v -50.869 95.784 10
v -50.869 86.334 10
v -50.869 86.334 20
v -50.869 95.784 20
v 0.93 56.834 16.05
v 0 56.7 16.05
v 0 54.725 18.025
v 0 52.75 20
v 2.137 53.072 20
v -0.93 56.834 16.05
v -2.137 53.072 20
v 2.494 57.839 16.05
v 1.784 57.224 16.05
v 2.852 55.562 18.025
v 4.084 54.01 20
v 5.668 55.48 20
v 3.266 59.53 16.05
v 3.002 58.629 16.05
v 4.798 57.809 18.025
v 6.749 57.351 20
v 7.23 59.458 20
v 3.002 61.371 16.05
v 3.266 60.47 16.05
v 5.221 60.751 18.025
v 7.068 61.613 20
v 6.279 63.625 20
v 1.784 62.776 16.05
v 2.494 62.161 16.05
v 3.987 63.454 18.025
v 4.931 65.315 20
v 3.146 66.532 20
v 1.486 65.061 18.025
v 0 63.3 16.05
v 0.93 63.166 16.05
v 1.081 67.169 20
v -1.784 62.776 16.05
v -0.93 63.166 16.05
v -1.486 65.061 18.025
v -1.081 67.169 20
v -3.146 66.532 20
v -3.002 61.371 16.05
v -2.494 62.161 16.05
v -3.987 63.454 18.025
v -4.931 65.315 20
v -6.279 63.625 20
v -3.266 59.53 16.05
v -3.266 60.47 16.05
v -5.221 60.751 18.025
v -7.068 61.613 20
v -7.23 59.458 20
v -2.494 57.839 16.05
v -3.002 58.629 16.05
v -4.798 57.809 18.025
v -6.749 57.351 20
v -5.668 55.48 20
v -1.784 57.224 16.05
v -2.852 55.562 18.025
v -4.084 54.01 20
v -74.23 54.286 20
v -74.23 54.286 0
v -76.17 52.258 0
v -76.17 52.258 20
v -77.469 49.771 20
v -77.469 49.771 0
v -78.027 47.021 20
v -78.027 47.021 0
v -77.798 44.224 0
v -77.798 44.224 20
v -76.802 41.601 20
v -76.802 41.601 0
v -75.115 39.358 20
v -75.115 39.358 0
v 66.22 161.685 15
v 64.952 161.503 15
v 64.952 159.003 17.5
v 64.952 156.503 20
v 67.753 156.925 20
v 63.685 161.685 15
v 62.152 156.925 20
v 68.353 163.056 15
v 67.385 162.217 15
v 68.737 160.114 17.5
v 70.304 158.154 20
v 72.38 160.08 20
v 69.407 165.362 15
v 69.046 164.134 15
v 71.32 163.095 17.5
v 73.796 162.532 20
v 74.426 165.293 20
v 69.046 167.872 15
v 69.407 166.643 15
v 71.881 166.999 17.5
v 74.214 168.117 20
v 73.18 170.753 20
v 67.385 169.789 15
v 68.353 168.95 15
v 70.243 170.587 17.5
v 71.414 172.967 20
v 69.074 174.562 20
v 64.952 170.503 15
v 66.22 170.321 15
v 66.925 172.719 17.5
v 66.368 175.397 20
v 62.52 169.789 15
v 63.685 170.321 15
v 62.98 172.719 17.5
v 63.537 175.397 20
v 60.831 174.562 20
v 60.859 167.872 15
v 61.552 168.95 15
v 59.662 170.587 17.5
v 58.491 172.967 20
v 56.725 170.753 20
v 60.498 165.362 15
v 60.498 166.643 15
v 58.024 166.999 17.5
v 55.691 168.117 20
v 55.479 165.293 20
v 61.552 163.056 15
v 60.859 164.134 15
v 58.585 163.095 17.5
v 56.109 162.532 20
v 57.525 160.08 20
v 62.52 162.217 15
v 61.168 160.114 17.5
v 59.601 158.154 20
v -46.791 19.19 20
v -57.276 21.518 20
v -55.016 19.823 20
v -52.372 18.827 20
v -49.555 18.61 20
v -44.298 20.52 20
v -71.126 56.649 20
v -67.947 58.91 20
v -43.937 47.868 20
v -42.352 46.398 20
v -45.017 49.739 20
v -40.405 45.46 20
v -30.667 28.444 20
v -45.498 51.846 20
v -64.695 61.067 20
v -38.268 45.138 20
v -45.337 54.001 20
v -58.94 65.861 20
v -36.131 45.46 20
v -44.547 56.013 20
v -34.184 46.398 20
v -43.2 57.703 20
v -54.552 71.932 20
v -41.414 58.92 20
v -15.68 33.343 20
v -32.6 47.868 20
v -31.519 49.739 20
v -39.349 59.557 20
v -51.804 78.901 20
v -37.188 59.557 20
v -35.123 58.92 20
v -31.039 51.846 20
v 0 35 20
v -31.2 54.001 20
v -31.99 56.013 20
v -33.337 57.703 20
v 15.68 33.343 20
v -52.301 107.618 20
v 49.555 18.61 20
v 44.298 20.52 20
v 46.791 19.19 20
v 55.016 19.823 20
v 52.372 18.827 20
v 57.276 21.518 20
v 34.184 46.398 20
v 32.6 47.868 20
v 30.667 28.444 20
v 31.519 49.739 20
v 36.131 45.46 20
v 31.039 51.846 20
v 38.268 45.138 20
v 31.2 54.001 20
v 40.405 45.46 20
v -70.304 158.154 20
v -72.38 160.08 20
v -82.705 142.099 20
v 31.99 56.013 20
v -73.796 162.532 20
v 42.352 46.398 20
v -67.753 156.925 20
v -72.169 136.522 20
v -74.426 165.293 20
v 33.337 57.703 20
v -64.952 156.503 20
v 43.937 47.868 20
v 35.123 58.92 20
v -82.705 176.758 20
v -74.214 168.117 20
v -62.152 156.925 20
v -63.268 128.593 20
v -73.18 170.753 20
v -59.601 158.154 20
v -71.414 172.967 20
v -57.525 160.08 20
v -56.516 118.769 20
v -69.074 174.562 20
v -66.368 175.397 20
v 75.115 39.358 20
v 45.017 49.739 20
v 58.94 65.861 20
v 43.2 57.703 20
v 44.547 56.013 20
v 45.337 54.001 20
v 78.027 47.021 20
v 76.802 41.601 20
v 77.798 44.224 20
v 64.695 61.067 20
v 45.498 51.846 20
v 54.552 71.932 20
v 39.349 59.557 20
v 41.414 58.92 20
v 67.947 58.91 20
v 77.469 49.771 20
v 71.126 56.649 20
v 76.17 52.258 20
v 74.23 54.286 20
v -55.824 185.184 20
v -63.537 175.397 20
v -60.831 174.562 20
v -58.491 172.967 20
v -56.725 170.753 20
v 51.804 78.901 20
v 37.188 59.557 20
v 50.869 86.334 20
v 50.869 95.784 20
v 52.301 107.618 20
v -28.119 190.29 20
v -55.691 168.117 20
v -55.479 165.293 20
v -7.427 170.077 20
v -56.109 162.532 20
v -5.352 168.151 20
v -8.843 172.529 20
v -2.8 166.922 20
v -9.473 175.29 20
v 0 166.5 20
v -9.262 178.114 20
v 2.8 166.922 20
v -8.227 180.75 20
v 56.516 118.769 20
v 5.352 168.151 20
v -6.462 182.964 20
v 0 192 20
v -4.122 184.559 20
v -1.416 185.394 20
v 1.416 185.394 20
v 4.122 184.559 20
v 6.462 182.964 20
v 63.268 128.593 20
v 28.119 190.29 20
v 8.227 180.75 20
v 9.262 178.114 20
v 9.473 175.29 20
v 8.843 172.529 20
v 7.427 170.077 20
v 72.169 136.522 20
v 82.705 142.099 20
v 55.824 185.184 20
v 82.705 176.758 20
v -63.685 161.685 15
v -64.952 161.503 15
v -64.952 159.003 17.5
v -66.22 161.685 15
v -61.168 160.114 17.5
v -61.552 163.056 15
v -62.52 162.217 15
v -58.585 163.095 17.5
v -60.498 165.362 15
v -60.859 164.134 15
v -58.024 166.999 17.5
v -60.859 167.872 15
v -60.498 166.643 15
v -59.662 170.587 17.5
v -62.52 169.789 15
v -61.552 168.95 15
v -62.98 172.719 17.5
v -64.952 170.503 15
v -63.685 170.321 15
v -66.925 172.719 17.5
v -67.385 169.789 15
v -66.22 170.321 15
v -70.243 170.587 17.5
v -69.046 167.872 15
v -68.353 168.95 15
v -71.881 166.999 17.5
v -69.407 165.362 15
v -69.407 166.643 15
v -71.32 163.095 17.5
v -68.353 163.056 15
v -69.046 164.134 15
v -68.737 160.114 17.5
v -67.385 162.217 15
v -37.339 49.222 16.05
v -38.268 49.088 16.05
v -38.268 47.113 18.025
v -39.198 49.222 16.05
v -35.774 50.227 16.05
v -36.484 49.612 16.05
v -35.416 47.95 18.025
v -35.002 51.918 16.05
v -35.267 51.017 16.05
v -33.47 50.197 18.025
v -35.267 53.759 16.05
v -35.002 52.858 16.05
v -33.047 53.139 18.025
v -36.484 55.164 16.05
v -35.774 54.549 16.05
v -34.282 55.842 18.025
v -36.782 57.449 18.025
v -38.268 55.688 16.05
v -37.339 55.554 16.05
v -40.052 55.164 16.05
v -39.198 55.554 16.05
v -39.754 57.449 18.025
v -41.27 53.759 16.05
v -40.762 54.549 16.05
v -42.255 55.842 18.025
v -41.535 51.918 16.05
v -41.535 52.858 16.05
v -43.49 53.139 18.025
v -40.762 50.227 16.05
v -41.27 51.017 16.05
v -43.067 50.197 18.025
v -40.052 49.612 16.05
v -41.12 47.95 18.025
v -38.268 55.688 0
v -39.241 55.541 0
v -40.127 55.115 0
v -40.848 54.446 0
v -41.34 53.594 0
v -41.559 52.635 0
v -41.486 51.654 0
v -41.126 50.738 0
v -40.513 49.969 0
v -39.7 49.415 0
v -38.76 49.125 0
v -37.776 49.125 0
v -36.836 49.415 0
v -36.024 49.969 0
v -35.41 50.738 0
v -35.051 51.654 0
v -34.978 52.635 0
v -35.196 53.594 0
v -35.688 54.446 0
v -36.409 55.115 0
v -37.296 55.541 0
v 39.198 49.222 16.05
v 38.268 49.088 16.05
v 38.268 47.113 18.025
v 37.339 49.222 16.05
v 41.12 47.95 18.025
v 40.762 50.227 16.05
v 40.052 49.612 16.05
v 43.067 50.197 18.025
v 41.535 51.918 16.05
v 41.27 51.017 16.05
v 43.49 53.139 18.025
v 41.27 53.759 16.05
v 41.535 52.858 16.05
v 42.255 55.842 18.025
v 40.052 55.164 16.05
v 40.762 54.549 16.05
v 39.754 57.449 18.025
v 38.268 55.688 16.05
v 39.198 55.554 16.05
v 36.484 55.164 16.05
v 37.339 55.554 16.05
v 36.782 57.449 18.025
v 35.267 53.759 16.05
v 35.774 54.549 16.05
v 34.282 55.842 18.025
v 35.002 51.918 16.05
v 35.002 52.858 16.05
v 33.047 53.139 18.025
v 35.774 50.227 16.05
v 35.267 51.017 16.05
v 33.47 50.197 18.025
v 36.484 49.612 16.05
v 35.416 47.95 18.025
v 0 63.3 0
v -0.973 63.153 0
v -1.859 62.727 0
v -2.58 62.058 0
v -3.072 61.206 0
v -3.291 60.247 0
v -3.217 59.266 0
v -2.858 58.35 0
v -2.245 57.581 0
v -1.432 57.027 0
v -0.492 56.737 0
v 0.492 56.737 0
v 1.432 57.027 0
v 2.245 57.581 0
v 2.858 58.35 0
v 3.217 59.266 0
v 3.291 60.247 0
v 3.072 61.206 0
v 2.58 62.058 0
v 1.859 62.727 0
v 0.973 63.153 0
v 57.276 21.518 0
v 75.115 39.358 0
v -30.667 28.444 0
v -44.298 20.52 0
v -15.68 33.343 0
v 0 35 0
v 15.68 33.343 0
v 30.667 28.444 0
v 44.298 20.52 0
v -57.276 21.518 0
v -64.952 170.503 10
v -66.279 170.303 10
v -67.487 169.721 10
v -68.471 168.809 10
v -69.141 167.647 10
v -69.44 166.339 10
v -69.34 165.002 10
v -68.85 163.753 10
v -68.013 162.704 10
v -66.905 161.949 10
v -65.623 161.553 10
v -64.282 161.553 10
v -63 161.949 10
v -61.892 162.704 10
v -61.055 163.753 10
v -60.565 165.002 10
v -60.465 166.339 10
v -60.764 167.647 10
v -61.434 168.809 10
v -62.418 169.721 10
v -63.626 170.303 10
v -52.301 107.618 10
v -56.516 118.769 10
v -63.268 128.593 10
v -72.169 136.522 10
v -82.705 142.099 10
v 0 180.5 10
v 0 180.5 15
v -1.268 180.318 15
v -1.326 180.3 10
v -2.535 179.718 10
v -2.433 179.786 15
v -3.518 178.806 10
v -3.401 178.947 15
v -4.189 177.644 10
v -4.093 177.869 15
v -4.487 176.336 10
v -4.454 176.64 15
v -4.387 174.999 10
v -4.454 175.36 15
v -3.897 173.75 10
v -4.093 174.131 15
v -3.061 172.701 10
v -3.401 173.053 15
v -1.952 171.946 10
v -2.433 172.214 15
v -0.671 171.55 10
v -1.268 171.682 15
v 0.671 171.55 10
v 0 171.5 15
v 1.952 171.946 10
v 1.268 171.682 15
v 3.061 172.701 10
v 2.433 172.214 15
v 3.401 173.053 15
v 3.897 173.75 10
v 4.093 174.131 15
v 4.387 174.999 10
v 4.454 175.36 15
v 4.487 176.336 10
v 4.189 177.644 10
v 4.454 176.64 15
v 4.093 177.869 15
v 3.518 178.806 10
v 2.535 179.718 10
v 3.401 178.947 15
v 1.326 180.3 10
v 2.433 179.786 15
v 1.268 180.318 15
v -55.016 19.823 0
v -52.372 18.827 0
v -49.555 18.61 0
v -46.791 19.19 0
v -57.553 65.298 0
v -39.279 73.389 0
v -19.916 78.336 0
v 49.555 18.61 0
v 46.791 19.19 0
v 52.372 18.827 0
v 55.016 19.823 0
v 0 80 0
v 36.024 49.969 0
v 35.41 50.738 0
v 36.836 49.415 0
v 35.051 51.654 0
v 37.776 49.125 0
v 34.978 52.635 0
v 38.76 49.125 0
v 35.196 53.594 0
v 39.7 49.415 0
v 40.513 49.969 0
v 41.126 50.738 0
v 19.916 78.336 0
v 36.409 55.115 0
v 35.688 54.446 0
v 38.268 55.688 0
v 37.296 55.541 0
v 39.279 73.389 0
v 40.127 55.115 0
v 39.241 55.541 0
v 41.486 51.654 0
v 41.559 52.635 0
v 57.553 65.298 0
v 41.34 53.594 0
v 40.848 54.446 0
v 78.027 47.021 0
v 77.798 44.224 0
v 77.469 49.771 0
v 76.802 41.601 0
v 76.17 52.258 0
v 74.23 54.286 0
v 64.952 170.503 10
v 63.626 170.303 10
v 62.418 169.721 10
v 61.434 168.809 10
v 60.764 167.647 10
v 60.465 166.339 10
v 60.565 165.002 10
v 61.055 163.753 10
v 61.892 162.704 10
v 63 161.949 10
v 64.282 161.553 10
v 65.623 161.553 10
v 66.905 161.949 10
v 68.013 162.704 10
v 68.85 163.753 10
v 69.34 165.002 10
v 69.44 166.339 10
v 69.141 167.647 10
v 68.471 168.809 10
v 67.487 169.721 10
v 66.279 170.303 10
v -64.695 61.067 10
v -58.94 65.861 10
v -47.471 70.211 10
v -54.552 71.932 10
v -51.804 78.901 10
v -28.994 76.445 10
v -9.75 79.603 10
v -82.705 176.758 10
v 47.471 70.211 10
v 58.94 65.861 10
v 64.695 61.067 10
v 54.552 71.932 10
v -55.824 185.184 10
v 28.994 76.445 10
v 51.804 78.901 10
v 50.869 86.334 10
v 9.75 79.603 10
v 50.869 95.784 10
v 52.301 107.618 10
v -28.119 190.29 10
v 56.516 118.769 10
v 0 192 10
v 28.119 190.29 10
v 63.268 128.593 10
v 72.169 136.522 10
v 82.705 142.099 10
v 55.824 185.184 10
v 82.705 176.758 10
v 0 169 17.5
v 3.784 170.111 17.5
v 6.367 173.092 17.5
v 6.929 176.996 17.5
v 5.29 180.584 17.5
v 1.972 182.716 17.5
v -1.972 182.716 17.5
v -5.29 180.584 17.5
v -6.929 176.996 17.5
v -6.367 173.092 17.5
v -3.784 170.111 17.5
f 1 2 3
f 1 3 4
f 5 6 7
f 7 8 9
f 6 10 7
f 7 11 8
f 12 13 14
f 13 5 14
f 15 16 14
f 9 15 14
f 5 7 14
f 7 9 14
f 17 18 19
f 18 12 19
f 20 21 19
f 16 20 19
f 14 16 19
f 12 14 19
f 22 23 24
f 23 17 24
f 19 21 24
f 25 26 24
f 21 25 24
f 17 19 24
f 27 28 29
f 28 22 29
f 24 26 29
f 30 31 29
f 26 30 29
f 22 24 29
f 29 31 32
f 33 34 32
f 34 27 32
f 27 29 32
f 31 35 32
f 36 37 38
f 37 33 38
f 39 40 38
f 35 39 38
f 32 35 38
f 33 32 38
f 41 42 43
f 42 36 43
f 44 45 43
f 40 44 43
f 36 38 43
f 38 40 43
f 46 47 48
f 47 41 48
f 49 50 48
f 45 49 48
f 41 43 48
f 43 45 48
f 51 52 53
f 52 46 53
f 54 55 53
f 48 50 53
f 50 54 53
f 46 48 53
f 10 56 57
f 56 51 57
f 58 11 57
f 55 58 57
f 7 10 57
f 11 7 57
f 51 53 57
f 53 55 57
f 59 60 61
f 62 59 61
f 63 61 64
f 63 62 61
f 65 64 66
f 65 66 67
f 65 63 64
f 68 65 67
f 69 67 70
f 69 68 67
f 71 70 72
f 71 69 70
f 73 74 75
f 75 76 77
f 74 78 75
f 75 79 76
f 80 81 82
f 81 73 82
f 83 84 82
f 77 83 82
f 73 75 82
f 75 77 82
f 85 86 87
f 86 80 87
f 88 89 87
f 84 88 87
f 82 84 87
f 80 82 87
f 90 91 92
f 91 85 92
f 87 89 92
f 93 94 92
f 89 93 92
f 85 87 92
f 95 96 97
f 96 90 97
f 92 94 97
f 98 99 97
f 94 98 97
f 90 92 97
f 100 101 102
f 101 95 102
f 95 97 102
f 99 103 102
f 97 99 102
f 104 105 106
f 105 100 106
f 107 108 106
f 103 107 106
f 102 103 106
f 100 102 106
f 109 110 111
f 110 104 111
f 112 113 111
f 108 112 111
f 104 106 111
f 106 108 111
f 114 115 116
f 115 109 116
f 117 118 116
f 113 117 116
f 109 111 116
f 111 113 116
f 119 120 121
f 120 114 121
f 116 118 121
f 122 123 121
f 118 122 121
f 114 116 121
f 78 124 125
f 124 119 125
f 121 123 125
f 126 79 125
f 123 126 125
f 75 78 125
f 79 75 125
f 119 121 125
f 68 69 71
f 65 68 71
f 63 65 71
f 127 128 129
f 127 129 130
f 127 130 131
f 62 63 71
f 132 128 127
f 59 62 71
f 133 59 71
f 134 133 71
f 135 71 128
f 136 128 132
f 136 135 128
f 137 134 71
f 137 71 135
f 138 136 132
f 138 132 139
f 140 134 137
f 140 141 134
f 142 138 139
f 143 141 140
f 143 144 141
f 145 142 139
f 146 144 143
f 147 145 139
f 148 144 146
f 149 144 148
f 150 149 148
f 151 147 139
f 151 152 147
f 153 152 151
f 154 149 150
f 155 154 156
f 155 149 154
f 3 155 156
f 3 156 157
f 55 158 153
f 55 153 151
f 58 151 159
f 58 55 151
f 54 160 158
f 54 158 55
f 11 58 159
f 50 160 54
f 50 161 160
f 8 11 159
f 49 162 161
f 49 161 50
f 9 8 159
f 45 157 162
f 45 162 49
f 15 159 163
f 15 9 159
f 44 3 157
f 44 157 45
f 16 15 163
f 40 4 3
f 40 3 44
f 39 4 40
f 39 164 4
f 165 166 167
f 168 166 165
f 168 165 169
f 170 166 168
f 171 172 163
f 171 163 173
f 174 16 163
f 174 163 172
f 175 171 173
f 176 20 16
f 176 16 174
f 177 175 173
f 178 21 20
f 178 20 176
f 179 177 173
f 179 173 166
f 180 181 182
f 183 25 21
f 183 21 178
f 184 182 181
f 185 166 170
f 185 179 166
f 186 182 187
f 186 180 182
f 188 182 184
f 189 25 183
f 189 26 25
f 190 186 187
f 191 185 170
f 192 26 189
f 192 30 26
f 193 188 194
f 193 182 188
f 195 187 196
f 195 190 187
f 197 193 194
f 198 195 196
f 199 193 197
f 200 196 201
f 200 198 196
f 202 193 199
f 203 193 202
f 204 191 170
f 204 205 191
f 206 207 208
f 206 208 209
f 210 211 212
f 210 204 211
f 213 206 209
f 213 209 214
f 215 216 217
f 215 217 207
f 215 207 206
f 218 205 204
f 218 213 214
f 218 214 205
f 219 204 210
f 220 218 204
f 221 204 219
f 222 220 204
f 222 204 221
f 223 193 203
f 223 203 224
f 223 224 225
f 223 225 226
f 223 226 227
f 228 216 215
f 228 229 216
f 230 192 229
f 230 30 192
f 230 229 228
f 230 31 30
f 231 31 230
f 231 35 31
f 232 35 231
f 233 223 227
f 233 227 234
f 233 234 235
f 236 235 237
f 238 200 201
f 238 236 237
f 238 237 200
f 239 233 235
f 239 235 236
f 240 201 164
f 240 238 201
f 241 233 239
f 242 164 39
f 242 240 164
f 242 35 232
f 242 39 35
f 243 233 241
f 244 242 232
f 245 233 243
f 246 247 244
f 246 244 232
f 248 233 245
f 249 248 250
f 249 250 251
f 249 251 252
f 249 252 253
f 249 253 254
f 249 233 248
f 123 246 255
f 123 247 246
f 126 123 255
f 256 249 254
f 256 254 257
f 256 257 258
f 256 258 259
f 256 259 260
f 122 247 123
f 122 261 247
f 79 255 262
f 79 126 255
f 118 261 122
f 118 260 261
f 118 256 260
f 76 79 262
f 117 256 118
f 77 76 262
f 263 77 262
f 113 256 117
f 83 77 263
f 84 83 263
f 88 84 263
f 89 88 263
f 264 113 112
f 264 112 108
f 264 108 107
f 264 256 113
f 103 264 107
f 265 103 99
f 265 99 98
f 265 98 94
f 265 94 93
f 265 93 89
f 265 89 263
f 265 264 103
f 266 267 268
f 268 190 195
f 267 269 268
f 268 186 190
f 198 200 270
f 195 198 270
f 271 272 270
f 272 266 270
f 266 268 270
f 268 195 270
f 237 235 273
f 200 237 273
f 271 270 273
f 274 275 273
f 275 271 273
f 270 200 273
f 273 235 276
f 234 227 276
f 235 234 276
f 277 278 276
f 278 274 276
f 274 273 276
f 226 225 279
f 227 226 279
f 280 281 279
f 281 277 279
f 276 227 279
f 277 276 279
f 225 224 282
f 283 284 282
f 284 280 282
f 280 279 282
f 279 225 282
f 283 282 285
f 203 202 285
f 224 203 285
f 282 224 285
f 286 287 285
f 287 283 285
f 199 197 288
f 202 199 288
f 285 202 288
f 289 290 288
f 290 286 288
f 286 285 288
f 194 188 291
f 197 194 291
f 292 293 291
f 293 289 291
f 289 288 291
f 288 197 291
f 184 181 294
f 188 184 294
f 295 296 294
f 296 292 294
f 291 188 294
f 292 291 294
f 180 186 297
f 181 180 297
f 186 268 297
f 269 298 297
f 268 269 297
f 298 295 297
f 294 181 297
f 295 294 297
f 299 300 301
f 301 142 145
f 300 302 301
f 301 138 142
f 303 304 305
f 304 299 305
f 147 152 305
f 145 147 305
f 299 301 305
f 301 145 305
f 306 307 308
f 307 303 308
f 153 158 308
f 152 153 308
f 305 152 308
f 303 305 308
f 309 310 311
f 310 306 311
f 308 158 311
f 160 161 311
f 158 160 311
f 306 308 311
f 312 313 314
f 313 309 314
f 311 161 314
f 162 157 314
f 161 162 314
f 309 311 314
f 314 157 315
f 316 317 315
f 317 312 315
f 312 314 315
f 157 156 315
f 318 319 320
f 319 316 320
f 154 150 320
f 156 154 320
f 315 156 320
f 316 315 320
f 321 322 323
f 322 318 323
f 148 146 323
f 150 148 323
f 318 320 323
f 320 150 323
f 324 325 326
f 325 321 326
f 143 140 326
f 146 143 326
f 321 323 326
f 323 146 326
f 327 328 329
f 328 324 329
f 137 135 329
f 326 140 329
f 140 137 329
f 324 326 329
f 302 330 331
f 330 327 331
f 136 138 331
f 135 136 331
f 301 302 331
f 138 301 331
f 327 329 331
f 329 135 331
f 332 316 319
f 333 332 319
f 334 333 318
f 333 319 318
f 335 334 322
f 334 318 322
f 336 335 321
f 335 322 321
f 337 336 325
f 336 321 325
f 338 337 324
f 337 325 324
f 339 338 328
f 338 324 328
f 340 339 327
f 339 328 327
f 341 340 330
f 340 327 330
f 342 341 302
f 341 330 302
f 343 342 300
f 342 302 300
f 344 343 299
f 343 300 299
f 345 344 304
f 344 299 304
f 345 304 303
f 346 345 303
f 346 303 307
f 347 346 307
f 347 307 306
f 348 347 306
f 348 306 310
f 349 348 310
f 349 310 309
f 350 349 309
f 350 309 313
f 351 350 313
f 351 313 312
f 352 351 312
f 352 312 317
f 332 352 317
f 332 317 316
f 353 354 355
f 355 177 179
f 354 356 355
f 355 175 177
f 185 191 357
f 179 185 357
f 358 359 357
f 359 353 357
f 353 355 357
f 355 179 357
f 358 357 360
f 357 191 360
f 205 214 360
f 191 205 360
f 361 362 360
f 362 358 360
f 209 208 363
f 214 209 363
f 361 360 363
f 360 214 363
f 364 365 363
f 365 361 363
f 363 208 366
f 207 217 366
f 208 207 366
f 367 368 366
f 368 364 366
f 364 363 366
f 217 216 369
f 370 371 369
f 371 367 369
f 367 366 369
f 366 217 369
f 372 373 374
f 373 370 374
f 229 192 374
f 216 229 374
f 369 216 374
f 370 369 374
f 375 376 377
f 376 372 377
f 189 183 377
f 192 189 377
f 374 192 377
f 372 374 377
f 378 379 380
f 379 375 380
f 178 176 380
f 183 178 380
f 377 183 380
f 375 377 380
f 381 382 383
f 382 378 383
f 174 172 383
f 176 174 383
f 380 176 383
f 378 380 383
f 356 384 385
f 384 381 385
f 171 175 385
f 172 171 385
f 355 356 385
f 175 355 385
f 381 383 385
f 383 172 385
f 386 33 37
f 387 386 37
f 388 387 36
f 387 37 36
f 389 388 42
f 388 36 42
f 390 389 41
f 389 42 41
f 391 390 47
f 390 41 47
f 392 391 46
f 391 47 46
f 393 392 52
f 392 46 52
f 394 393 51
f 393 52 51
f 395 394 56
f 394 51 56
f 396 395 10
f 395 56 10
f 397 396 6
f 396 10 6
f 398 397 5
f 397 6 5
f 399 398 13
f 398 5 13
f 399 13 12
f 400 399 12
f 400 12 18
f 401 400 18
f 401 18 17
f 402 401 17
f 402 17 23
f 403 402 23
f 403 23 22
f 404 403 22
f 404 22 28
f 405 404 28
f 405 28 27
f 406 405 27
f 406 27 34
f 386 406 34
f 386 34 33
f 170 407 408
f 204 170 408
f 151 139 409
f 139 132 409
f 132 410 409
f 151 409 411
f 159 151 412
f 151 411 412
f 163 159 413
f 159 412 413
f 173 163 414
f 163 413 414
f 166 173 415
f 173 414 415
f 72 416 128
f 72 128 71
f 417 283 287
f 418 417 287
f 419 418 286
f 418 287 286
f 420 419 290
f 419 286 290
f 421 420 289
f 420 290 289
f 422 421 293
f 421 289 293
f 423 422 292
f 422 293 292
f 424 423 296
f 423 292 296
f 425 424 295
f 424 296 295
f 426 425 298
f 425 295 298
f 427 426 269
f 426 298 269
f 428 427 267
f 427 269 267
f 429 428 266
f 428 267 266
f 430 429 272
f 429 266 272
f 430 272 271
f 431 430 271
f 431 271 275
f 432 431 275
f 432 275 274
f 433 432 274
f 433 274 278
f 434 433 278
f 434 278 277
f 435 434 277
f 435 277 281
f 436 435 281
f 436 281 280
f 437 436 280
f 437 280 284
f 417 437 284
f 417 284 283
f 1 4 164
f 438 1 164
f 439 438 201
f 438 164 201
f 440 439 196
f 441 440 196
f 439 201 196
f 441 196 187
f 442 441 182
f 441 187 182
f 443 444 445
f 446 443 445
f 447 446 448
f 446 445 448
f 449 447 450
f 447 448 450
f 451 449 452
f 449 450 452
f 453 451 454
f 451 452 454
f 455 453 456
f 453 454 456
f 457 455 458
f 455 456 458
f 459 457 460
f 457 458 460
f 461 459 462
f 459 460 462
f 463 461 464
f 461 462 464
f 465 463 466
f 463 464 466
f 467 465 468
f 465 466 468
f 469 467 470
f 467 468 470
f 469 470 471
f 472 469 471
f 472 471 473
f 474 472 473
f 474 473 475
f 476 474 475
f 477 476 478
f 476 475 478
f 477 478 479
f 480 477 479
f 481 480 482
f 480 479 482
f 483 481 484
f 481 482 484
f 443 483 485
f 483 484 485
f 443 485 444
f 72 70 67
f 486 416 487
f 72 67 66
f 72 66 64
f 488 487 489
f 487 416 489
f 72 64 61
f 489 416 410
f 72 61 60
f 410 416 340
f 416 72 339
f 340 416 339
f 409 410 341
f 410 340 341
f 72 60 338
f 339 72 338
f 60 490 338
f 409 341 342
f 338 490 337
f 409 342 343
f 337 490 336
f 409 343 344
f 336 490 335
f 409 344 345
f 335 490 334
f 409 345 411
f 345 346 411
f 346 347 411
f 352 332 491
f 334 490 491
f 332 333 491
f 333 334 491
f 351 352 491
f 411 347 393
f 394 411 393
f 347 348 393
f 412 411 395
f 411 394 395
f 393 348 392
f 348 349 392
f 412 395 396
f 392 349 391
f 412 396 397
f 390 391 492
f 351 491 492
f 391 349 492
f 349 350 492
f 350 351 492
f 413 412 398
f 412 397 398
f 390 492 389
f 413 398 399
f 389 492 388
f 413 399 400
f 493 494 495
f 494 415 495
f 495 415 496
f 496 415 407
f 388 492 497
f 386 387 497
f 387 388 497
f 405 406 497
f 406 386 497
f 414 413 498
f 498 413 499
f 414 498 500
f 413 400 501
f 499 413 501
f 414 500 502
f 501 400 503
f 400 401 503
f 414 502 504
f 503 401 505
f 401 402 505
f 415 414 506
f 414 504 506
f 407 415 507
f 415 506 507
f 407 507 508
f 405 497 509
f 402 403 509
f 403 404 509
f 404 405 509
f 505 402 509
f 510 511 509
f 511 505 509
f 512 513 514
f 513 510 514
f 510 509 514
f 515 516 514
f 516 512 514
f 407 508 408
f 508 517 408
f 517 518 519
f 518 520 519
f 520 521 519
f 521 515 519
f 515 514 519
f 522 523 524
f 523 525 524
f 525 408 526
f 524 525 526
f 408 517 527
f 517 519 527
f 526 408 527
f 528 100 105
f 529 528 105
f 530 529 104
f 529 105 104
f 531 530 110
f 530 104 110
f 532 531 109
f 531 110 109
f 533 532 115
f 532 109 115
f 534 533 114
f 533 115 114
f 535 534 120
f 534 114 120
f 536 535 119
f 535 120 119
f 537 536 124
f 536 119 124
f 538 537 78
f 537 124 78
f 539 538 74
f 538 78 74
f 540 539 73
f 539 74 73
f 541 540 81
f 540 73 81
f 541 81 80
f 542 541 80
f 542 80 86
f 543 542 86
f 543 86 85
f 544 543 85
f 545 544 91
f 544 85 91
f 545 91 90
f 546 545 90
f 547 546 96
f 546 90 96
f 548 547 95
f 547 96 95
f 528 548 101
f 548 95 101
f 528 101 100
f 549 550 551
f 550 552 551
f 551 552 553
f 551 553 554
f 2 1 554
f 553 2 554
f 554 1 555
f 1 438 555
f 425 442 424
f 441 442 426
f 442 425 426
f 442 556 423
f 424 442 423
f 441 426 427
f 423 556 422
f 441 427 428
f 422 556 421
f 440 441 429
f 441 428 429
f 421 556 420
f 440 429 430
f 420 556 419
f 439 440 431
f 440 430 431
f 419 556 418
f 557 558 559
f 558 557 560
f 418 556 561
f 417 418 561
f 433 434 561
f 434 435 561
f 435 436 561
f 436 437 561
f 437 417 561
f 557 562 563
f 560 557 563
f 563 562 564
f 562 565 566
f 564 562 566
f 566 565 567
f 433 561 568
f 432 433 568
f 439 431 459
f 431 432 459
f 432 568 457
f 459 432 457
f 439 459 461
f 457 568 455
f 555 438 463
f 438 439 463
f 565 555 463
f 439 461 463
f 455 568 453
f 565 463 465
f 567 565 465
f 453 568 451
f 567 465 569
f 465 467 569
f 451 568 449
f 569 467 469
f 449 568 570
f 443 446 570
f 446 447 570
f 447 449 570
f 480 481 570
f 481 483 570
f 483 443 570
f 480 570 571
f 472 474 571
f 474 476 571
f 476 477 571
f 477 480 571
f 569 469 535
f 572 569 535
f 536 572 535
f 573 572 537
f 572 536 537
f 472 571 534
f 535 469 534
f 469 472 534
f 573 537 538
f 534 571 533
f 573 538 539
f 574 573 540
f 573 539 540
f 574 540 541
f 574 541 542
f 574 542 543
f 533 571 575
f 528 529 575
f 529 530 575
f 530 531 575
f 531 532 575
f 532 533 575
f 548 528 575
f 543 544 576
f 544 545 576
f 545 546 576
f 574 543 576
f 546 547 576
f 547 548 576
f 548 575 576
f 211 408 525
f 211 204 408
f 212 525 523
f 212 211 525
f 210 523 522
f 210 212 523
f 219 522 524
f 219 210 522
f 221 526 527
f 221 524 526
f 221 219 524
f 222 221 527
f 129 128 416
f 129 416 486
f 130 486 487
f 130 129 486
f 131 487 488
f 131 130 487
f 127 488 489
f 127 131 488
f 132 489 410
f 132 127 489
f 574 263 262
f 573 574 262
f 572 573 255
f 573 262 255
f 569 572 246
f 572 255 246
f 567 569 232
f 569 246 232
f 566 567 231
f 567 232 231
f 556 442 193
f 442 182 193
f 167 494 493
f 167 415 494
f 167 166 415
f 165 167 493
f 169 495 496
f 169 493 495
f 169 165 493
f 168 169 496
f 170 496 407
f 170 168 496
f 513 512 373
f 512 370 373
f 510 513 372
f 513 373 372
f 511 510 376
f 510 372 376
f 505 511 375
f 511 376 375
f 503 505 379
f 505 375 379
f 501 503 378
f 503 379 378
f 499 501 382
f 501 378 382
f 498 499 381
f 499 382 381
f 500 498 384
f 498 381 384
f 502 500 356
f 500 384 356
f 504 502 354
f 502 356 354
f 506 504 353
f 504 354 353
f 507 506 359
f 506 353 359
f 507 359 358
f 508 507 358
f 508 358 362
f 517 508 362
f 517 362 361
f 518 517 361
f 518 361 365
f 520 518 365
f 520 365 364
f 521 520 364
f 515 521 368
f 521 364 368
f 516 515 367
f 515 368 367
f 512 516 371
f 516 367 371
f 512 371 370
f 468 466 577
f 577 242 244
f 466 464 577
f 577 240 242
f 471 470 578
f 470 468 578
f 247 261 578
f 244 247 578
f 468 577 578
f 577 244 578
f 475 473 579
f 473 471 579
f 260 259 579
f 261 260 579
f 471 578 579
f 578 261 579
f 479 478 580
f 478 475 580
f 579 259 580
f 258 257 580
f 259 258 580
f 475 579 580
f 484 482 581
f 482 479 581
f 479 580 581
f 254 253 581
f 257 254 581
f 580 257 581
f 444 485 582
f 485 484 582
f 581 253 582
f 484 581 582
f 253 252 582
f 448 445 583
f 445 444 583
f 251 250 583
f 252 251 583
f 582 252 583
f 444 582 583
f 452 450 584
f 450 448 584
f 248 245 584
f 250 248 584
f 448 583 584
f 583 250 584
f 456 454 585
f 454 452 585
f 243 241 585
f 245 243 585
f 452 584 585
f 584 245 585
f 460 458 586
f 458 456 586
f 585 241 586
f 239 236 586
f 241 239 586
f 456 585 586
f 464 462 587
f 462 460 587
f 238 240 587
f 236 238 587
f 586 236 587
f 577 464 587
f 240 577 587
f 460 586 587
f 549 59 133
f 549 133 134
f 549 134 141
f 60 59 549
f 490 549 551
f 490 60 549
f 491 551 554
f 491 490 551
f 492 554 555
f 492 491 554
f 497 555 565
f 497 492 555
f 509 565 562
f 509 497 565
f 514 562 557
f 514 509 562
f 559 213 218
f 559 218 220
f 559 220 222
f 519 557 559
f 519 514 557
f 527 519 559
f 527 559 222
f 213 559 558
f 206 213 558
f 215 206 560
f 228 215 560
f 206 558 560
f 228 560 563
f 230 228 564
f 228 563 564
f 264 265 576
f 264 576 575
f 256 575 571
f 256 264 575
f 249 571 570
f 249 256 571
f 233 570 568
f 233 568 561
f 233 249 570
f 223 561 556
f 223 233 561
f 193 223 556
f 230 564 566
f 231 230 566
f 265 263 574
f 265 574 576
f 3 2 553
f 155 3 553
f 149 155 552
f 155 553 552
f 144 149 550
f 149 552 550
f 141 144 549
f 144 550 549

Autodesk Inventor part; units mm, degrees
ref_plane "YZ Plane" through (0, 0, 0) normal (1, 0, 0) x (0, 1, 0)
ref_plane "XZ Plane" through (0, 0, 0) normal (0, 1, 0) x (-1, 0, 0)
ref_plane "XY Plane" through (0, 0, 0) normal (0, 0, 1) x (1, 0, 0)
sketch "Skizze1" plane through (0, 0, 0) normal (0, 0, 1) x (1, 0, 0)
  arc A0 (119.8865, -45.2174) -> (-119.8865, -45.2174) centre (0, -40) ccw construction
  arc A1 (53.033, 13.033) -> (-53.033, 13.033) centre (0, -40) ccw construction
  line L0 (53.033, 13.033) -> (84.8528, 44.8528)
  line L1 (26.163, -9.5944) -> (68.5894, 32.832) construction
  line L2 (0, 0) -> (0, 80) construction
  line L3 (-53.033, 13.033) -> (-84.8528, 44.8528)
  arc A2 (53.033, 13.033) -> (-53.033, 13.033) centre (0, -40) ccw
  arc A3 (84.8528, 44.8528) -> (-84.8528, 44.8528) centre (0, -40) ccw
  arc A4 (41.04, 51.2399) -> (35.4967, 53.536) centre (38.2683, 52.388) ccw construction
  arc A5 (-35.4967, 53.536) -> (-41.04, 51.2399) centre (-38.2683, 52.388) ccw construction
  arc A6 (3, 60) -> (-3, 60) centre (0, 60) ccw construction
  line L4 (50.8692, 15.1119) -> (82.705, 46.9476)
  line L5 (-68.5894, 32.832) -> (-26.163, -9.5944) construction
  line L6 (-50.8692, 15.1119) -> (-82.705, 46.9476)
  circle A7 centre (0, -40) radius 16.5 construction
  line L7 (0, -40) -> (0, 160) construction
  arc A8 (82.705, 176.7577) -> (-82.705, 176.7577) centre (0, -40) ccw
  line L8 (82.705, 46.9476) -> (82.705, 176.7577)
  line L9 (-82.705, 46.9476) -> (-82.705, 176.7577)
  arc A9 (82.705, 142.0986) -> (-82.705, 142.0986) centre (0, -40) ccw construction
  line L10 (50.8692, 15.1119) -> (50.8692, 95.7841)
  arc A10 (82.705, 142.0986) -> (50.8692, 95.7841) centre (100.4762, 95.7841) ccw
  arc A11 (82.705, 79.1003) -> (-82.705, 79.1003) centre (0, -40) ccw construction
  line L11 (-50.8692, 15.1119) -> (-50.8692, 95.7841)
  arc A12 (-50.8692, 95.7841) -> (-82.705, 142.0986) centre (-100.4762, 95.7841) ccw
  arc A13 (82.705, 159.5392) -> (-82.705, 159.5392) centre (0, -40) ccw construction
  line L12 (64.9525, 166.0029) -> (0, -40) construction
  line L13 (0, -40) -> (-64.9525, 166.0029) construction
  circle A14 centre (64.9525, 166.0029) radius 30 construction
  circle A15 centre (0, 176) radius 30 construction
  circle A16 centre (-64.9525, 166.0029) radius 30 construction
  line L14 (0, 105) -> (0, 125) construction
  line L15 (6, 105) -> (6, 125)
  line L16 (-6, 125) -> (-6, 105)
  arc A17 (-6, 105) -> (6, 105) centre (0, 105) ccw
  arc A18 (6, 125) -> (-6, 125) centre (0, 125) ccw
  point P0 (0, 192)
  point P1 (-50.8692, 68.6845)
  point P2 (50.8692, 68.6845)
  point P3 (0, 115)
  dimension "d0" = 45
  dimension "d4" = 200
  dimension "d5" = 32
  dimension "d6" = 25
  dimension "d7" = 32
  dimension "d8" = 16
  dimension "d9" = 35
  dimension "d10" = 17.5
  dimension "d11" = 60
  dimension "d12" = 60
  dimension "d13" = 60
  dimension "d32" = 20
  dimension "d33" = 12
extrude "Extrusion1" add sketch "Skizze1" along normal blind 20 contours L10 A3 L4 | A2 L11 A3 L10 | L6 A3 L11
ref_plane "Arbeitsebene1" through (0, 0, 10) normal (0, 0, 1) x (1, 0, 0)
extrude "Extrusion2" add sketch "Skizze1" against normal blind 10 from surface at 20 contours A3 L11 A12 L9 A8 L8 A10 L10 | A17 L16 A18 L15
hole "Bohrung1" at (38.2683, 52.388, 0) at (0, 60, 0) at (-38.2683, 52.388, 0) direction (0, 0, 1) diameter 6.6 end through all clearance for "Inbusschraube DIN EN ISO 4762" size "M6" standard "DIN"
hole "Bohrung2" at (64.9525, 166.0029, 0) at (0, 176, 0) at (-64.9525, 166.0029, 0) direction (0, 0, 1) diameter 9 end through all clearance for "Inbusschraube DIN EN ISO 4762" size "M8" standard "DIN"
fillet "Rundung1" radius 30 2 edges at (50.8692, 68.6845, 15) (-50.8692, 68.6845, 15)
fillet "Rundung2" radius 10 4 edges at (-82.705, 46.9476, 10) (82.705, 46.9476, 10) (50.8692, 15.1119, 10) (-50.8692, 15.1119, 10)
sketch "Skizze2" plane through (0, 0, 20) normal (0, 0, 1) x (1, 0, 0)
  point P0 (0, 0)
  point P1 (64.9525, 166.0029)
  point P2 (0, 176)
  point P3 (-64.9525, 166.0029)
hole "Bohrung3" at (64.9525, 166.0029, 20) at (0, 176, 20) at (-64.9525, 166.0029, 20) direction (0, 0, -1) diameter 9 end through all countersink diameter 19 countersink angle 90 clearance for "Innensechskant-Senkkopfschraube DIN EN ISO 10642" size "M8" standard "DIN"
sketch "Skizze3" plane through (0, 0, 20) normal (0, 0, 1) x (1, 0, 0)
  point P0 (0, 0)
  point P1 (38.2683, 52.388)
  point P2 (0, 60)
  point P3 (-38.2683, 52.388)
hole "Bohrung4" at (38.2683, 52.388, 20) at (0, 60, 20) at (-38.2683, 52.388, 20) direction (0, 0, -1) diameter 6.6 end through all countersink diameter 14.5 countersink angle 90 clearance for "Innensechskant-Senkkopfschraube DIN EN ISO 10642" size "M6" standard "DIN"
equation "\"d8\" = 0.5 * d7"
equation "\"d10\" = 0.5 * d9"
properties part number "CounterweightFixation_Axis0" material "PMMA-Kunststoff"
